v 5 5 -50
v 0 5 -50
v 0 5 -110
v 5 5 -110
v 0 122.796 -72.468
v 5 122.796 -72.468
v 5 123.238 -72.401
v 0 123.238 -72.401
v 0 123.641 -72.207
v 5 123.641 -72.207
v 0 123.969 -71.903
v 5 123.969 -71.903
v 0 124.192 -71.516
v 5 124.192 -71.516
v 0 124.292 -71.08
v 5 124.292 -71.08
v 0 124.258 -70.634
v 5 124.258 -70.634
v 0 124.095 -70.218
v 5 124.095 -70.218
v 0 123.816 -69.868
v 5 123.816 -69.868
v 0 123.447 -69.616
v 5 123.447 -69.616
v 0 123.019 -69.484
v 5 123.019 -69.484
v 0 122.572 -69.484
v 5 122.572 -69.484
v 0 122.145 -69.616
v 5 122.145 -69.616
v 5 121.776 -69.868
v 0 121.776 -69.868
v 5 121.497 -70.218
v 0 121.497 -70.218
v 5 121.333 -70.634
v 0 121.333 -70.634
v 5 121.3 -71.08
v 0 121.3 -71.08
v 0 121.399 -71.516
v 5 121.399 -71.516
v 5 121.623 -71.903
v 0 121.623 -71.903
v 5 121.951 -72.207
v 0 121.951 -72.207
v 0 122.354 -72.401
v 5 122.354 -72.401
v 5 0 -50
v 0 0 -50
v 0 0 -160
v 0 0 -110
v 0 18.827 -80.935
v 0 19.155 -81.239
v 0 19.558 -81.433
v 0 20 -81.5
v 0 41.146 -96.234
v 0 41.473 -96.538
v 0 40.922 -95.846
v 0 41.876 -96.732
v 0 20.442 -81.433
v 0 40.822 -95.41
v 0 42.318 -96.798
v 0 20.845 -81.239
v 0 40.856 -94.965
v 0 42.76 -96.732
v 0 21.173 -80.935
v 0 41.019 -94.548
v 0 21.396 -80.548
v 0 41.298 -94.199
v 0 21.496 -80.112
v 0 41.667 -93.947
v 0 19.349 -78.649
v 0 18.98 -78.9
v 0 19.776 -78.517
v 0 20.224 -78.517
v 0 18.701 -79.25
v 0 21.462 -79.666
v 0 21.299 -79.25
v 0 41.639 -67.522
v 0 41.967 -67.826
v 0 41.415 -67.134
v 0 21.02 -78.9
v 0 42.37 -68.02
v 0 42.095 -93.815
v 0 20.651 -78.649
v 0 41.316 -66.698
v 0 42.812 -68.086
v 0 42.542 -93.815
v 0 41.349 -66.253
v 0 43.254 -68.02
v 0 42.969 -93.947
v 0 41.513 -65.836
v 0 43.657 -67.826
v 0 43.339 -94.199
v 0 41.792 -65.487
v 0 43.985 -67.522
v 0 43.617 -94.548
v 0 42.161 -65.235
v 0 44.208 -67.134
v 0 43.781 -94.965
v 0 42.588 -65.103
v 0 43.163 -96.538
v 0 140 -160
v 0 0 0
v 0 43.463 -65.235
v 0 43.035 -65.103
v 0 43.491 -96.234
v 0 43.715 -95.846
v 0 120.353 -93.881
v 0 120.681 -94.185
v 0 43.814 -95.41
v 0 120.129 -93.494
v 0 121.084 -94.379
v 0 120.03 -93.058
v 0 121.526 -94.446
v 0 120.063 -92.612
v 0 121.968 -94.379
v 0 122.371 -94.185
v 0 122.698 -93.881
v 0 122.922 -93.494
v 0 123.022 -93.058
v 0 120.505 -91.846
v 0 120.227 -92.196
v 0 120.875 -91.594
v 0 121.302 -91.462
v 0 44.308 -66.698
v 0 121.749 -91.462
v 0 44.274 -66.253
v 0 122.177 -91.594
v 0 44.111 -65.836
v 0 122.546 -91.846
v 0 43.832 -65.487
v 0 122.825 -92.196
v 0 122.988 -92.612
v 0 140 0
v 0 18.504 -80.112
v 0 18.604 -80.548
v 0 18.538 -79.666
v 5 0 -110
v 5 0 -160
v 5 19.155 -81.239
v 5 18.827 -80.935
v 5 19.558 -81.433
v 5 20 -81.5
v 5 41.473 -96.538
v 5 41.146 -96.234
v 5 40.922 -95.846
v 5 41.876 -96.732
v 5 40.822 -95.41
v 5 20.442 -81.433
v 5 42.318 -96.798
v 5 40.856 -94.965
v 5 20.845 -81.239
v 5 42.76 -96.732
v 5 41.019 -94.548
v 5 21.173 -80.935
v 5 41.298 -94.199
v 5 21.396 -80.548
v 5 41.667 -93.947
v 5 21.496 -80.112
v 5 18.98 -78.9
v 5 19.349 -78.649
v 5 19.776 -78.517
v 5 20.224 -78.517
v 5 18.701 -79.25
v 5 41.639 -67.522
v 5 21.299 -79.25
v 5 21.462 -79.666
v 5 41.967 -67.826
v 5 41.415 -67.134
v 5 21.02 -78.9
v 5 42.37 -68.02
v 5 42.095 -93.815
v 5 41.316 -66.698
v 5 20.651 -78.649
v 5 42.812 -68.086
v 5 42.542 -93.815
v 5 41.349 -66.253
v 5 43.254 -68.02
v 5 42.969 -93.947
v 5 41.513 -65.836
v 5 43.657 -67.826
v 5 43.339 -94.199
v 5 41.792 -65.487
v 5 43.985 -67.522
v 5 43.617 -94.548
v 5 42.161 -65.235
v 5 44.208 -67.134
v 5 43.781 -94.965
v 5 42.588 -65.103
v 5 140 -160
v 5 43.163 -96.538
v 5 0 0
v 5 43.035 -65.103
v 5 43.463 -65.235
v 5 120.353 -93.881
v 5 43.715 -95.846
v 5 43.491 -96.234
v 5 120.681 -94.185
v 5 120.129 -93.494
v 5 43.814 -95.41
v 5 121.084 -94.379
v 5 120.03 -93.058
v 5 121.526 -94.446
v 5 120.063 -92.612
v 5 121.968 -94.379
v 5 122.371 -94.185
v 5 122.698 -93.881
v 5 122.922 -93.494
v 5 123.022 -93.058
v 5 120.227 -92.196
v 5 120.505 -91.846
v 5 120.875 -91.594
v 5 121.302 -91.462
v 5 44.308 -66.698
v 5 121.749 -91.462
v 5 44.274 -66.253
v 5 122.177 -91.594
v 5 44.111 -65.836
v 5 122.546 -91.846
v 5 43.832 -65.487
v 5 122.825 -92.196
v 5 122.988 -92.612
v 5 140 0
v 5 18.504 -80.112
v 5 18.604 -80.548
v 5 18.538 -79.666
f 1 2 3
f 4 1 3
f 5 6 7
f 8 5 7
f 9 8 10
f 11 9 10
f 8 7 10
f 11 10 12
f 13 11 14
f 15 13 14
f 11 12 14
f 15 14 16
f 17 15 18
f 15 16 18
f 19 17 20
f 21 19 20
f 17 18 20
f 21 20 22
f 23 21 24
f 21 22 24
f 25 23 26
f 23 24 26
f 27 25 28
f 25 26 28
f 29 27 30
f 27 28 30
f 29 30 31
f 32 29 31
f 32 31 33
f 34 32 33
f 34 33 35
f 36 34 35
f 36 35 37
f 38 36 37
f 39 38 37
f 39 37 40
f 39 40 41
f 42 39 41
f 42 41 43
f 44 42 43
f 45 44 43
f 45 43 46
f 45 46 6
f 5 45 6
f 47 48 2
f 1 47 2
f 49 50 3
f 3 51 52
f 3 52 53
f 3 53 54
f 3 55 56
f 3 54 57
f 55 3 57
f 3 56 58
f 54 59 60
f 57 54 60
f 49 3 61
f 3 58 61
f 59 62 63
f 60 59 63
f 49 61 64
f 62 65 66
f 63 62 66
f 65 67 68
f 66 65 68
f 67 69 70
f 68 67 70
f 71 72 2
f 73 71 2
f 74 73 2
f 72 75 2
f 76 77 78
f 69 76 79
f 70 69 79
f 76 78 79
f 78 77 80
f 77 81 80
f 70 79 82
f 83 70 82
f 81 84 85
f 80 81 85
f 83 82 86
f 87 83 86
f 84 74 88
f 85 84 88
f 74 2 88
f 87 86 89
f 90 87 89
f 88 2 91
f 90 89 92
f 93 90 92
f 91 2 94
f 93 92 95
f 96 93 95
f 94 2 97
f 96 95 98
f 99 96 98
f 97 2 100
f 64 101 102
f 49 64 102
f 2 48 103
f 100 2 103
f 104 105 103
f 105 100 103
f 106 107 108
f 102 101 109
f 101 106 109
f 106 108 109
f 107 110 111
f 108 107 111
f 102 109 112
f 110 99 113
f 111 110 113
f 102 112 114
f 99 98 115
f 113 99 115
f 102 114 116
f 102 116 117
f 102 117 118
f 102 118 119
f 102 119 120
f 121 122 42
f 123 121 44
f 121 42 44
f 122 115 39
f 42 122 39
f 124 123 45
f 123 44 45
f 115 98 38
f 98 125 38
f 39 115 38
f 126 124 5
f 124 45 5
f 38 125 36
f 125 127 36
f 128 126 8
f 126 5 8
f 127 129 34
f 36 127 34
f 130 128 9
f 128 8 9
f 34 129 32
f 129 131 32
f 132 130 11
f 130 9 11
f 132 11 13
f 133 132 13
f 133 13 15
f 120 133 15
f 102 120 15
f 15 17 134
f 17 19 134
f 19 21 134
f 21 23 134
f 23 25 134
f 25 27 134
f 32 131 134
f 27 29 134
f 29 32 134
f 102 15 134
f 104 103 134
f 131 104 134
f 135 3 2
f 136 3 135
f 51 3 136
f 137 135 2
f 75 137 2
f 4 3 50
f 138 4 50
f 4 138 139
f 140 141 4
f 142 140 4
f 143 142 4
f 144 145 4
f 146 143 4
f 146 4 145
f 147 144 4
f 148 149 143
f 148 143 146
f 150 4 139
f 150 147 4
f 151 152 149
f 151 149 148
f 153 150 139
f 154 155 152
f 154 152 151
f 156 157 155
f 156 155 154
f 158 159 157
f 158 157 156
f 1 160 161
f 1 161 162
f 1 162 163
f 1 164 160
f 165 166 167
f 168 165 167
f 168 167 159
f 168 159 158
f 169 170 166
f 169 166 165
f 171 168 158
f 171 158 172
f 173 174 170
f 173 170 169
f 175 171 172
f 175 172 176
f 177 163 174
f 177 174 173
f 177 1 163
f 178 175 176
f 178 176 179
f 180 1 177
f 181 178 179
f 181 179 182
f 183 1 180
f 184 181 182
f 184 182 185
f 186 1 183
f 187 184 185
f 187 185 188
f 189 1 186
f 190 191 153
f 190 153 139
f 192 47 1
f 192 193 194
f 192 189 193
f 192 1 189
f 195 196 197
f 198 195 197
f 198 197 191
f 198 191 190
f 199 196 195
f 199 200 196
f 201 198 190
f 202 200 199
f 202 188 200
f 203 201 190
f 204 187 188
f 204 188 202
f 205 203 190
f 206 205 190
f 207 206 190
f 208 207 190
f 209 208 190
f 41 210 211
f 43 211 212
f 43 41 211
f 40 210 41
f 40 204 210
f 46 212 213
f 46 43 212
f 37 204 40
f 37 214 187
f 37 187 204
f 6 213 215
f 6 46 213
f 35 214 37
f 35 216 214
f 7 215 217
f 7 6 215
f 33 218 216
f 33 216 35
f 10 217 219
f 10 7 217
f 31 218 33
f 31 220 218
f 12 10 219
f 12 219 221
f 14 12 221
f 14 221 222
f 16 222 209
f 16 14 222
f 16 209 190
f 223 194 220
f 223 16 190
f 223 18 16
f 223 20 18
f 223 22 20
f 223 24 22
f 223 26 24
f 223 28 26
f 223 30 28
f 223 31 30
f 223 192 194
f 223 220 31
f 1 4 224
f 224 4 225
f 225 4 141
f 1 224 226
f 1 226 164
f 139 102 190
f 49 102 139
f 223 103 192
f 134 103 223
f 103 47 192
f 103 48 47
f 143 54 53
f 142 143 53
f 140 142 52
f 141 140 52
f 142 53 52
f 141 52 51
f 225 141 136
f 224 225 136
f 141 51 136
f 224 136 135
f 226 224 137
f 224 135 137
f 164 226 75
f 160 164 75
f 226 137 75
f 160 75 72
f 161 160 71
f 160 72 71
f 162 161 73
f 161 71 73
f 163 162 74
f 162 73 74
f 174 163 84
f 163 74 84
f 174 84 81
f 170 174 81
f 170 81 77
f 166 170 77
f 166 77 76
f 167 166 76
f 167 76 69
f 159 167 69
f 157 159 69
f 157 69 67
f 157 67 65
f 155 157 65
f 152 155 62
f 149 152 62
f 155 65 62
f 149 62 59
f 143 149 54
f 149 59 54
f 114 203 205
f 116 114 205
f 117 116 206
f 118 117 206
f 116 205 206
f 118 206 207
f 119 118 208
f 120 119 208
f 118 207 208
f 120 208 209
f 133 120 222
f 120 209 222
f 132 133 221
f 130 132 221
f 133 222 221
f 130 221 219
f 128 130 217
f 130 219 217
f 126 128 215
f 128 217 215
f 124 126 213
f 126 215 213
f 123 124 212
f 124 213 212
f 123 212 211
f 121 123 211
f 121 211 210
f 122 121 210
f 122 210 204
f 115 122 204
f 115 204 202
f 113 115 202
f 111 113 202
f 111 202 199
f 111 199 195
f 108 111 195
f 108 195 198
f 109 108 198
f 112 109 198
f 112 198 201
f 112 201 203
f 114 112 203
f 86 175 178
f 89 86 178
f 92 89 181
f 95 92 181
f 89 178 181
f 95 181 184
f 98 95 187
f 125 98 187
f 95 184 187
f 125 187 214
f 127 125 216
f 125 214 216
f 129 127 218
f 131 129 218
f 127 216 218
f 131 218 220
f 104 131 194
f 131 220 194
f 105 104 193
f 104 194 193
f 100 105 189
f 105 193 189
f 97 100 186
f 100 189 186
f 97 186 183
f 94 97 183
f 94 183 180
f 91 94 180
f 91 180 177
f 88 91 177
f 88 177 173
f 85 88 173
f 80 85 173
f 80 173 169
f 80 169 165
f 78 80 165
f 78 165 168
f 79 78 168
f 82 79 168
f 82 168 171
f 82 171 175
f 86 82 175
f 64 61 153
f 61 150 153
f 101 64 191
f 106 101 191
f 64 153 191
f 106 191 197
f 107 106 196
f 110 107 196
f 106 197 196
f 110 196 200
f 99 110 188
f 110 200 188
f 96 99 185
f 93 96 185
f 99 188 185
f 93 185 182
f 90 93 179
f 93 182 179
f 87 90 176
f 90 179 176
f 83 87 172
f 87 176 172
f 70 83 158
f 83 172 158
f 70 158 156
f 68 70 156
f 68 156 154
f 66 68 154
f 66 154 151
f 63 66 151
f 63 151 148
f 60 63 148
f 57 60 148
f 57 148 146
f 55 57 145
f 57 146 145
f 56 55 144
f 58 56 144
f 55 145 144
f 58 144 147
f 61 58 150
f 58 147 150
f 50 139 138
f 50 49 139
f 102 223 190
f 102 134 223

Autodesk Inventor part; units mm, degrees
ref_plane "YZ Plane" through (0, 0, 0) normal (1, 0, 0) x (0, 1, 0)
ref_plane "XZ Plane" through (0, 0, 0) normal (0, 1, 0) x (-1, 0, 0)
ref_plane "XY Plane" through (0, 0, 0) normal (0, 0, 1) x (1, 0, 0)
sketch "Sketch1" plane through (0, 0, 0) normal (1, 0, 0) x (0, 1, 0)
  line L0 (0, 0) -> (140, 0)
  line L1 (140, 0) -> (140, -160)
  line L2 (140, -160) -> (0, -160)
  line L3 (0, -160) -> (0, 0)
  line L4 (0, -50) -> (5, -50)
  line L5 (5, -50) -> (5, -110)
  line L6 (5, -110) -> (0, -110)
  line L7 (0, -110) -> (0, -50)
  point P0 (0, -110)
  dimension "d0" = 140
  dimension "d1" = 160
  dimension "d2" = 5
  dimension "d3" = 60
  dimension "d4" = 50
extrude "Extrusion1" add sketch "Sketch1" along normal blind 5 contours L0 L1 L2 L3 L6 L5 L4
sketch "Sketch2" plane through (5, 0, 0) normal (1, 0, 0) x (0, 0, -1)
  line L0 (0, 0) -> (50, 0) projected
  line L1 (50, 0) -> (50, 5) projected
  point P0 (80, 20)
  dimension "d14" = 20
  dimension "d15" = 30
hole "Hole1" at (5, 20, -80) direction (-1, 0, 0) diameter 3 end through all
sketch "Sketch12" plane through (5, 0, 0) normal (1, 0, 0) x (0, 0, -1)
  circle A0 centre (95.2983, 42.3183) radius 1.5 projected
  circle A1 centre (92.9456, 121.5257) radius 1.5 projected
  circle A2 centre (70.9676, 122.7958) radius 1.5 projected
  circle A3 centre (66.5863, 42.8118) radius 1.5 projected
  point P0 (0, 0)
extrude "Extrusion5" cut sketch "Sketch12" against normal through all
properties part number "TOP_1"
